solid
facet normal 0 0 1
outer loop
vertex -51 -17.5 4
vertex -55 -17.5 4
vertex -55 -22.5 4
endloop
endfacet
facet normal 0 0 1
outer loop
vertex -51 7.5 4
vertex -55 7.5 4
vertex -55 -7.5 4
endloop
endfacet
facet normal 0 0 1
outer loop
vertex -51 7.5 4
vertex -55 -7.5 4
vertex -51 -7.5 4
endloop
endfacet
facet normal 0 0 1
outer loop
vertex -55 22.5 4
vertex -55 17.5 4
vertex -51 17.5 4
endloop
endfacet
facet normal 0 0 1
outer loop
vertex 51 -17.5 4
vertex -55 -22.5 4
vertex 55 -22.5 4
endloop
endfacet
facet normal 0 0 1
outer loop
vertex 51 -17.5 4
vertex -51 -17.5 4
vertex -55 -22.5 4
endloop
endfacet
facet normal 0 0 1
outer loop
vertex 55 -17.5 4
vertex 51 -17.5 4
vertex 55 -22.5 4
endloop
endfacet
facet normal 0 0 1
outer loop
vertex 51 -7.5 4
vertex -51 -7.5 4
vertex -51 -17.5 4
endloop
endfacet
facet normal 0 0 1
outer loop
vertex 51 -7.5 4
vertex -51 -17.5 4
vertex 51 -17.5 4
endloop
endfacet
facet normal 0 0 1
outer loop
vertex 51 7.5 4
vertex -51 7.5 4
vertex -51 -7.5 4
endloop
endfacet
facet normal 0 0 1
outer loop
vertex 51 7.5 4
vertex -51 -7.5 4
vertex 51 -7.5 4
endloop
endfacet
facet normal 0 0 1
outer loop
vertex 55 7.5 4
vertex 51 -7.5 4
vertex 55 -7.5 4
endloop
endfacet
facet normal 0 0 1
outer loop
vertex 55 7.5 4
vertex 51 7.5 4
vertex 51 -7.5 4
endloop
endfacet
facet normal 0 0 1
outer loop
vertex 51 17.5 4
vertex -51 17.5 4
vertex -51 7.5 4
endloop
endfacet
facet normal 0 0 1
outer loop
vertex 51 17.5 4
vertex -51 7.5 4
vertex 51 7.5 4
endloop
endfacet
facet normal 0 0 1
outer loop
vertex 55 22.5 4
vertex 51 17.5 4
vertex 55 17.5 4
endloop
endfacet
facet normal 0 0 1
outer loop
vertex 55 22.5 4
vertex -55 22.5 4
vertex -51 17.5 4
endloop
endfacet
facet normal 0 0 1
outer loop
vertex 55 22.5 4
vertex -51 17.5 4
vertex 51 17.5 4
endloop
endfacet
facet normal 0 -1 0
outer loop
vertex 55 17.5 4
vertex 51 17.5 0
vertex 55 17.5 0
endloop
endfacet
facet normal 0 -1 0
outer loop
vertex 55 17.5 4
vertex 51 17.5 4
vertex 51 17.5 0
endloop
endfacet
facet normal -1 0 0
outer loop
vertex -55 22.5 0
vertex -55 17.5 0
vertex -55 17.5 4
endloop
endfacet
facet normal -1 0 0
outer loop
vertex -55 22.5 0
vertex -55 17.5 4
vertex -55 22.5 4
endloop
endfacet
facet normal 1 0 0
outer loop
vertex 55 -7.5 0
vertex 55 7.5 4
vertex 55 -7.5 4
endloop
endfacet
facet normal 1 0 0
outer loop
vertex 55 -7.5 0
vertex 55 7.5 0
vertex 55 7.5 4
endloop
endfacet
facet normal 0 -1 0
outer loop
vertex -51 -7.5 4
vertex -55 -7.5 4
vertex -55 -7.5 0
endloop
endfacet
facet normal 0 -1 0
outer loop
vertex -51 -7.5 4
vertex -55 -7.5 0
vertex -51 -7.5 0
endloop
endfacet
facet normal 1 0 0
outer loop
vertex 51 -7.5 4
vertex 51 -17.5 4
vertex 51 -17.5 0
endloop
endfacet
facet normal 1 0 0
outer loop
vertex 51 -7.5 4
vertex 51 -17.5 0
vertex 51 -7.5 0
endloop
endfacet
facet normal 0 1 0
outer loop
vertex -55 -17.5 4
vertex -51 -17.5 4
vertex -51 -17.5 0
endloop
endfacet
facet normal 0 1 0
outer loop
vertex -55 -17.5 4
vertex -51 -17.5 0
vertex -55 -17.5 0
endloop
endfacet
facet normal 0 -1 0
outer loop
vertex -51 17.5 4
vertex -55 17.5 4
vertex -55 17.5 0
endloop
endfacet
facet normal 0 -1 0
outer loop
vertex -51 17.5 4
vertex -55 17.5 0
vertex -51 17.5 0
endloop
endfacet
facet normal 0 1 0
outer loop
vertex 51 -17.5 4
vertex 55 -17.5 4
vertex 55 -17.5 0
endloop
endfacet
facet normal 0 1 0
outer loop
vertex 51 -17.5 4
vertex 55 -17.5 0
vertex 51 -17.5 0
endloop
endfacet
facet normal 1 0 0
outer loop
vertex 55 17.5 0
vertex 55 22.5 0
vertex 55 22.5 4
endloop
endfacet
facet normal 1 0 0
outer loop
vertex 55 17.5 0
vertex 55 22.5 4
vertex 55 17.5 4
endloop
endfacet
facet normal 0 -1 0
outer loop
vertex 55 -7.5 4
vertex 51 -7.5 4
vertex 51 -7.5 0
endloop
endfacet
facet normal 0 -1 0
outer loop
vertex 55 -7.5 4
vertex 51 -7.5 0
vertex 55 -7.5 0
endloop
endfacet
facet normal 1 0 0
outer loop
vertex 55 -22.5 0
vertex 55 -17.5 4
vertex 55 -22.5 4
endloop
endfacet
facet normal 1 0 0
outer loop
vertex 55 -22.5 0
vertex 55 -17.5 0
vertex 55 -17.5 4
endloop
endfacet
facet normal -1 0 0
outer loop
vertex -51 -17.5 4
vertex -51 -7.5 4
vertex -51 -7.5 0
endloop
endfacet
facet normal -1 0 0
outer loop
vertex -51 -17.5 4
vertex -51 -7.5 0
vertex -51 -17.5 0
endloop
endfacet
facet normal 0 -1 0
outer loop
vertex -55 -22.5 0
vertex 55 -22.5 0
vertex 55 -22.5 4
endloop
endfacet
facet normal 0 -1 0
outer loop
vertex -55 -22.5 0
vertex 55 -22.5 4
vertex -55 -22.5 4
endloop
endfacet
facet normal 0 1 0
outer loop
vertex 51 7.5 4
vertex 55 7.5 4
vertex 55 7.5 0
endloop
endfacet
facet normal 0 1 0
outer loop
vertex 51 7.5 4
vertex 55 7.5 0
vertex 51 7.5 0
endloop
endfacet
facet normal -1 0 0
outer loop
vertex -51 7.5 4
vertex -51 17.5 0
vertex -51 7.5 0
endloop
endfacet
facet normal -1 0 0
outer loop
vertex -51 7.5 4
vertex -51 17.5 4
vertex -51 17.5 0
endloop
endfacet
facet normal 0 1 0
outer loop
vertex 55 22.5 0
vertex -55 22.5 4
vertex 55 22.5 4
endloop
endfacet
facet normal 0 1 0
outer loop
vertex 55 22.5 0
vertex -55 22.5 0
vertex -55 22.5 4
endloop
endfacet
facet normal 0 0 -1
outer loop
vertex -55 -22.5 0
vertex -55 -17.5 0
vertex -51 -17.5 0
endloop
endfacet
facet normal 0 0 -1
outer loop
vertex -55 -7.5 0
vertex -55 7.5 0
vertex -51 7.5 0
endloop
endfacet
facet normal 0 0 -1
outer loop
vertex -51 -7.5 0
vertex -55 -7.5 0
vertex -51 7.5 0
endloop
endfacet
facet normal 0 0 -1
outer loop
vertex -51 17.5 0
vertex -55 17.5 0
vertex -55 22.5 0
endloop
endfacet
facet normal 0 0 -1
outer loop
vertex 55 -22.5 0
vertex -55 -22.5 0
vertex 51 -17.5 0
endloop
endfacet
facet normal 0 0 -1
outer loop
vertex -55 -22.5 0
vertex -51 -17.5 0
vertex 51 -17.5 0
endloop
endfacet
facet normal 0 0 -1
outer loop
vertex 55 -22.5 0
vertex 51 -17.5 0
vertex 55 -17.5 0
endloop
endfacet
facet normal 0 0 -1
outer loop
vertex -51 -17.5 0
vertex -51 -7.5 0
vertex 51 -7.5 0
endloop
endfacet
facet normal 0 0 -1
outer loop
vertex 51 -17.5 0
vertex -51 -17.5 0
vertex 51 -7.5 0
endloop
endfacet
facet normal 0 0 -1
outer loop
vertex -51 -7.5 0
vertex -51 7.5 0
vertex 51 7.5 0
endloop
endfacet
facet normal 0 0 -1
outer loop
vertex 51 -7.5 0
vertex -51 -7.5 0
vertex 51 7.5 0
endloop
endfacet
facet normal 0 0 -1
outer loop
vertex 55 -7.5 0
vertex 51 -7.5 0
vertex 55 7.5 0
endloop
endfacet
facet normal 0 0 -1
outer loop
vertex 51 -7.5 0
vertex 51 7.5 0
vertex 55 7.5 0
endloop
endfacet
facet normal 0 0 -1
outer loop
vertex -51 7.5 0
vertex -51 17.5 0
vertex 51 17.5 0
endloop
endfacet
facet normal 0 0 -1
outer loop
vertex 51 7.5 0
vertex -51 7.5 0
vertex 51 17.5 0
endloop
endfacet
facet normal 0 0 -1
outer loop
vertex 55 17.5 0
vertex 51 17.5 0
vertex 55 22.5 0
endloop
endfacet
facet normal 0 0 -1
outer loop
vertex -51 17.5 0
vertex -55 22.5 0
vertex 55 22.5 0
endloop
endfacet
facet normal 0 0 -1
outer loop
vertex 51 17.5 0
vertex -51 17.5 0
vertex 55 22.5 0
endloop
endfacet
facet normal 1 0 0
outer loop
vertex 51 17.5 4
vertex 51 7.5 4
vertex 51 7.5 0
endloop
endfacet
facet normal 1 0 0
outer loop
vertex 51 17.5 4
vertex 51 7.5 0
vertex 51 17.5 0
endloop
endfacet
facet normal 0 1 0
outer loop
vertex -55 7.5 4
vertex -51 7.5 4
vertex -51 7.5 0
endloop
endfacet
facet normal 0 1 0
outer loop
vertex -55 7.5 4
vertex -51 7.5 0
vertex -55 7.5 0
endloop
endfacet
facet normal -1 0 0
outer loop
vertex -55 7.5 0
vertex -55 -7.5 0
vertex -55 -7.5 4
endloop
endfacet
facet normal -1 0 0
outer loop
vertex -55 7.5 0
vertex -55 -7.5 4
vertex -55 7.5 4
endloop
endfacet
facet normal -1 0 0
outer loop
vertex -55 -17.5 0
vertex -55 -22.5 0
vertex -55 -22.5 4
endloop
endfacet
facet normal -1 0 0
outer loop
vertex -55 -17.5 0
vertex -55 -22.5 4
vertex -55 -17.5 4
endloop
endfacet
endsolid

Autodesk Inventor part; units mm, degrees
ref_plane "YZ Plane" through (0, 0, 0) normal (1, 0, 0) x (0, 1, 0)
ref_plane "XZ Plane" through (0, 0, 0) normal (0, 1, 0) x (-1, 0, 0)
sketch "Sketch1" plane through (0, 0, 0) normal (0, 0, 1) x (1, 0, 0)
  line L0 (55, -22.5) -> (-55, -22.5)
  line L1 (-55, -22.5) -> (-55, 22.5)
  line L2 (-55, 22.5) -> (55, 22.5)
  line L3 (55, 22.5) -> (55, -22.5)
  line L4 (55, -22.5) -> (-55, 22.5) construction
  line L5 (-55, -22.5) -> (55, 22.5) construction
  point P0 (0, 0)
  dimension "d0" = 110
  dimension "d1" = 45
extrude "Extrusion1" add sketch "Sketch1" along normal blind 4
sketch "Sketch2" plane through (0, 0, 4) normal (0, 0, 1) x (1, 0, 0)
  line L0 (-55, 22.5) -> (-55, -22.5) projected
  line L1 (-55, 17.5) -> (-51, 17.5)
  line L2 (-51, 17.5) -> (-51, 7.5)
  line L3 (-51, 7.5) -> (-55, 7.5)
  line L4 (-55, 7.5) -> (-55, 17.5)
  line L5 (-55, -7.5) -> (-51, -7.5)
  line L6 (-51, -7.5) -> (-51, -17.5)
  line L7 (-51, -17.5) -> (-55, -17.5)
  line L8 (-55, -17.5) -> (-55, -7.5)
  line L9 (55, 22.5) -> (-55, 22.5) projected
  line L10 (-55, -22.5) -> (55, -22.5) projected
  point P0 (0, 0)
  dimension "d4" = 4
  dimension "d5" = 10
  dimension "d6" = 4
  dimension "d7" = 10
  dimension "d8" = 5
  dimension "d9" = 5
extrude "Extrusion2" cut sketch "Sketch2" against normal blind 4
ref_plane "Work Plane2" through (0, -7.5, 0) normal (-1, 0, 0) x (0, 0, 1)
mirror "Mirror1" about plane through (0, -7.5, 0) normal (-1, 0, 0) of "Extrusion2"
properties part number "FUENTE 1"
